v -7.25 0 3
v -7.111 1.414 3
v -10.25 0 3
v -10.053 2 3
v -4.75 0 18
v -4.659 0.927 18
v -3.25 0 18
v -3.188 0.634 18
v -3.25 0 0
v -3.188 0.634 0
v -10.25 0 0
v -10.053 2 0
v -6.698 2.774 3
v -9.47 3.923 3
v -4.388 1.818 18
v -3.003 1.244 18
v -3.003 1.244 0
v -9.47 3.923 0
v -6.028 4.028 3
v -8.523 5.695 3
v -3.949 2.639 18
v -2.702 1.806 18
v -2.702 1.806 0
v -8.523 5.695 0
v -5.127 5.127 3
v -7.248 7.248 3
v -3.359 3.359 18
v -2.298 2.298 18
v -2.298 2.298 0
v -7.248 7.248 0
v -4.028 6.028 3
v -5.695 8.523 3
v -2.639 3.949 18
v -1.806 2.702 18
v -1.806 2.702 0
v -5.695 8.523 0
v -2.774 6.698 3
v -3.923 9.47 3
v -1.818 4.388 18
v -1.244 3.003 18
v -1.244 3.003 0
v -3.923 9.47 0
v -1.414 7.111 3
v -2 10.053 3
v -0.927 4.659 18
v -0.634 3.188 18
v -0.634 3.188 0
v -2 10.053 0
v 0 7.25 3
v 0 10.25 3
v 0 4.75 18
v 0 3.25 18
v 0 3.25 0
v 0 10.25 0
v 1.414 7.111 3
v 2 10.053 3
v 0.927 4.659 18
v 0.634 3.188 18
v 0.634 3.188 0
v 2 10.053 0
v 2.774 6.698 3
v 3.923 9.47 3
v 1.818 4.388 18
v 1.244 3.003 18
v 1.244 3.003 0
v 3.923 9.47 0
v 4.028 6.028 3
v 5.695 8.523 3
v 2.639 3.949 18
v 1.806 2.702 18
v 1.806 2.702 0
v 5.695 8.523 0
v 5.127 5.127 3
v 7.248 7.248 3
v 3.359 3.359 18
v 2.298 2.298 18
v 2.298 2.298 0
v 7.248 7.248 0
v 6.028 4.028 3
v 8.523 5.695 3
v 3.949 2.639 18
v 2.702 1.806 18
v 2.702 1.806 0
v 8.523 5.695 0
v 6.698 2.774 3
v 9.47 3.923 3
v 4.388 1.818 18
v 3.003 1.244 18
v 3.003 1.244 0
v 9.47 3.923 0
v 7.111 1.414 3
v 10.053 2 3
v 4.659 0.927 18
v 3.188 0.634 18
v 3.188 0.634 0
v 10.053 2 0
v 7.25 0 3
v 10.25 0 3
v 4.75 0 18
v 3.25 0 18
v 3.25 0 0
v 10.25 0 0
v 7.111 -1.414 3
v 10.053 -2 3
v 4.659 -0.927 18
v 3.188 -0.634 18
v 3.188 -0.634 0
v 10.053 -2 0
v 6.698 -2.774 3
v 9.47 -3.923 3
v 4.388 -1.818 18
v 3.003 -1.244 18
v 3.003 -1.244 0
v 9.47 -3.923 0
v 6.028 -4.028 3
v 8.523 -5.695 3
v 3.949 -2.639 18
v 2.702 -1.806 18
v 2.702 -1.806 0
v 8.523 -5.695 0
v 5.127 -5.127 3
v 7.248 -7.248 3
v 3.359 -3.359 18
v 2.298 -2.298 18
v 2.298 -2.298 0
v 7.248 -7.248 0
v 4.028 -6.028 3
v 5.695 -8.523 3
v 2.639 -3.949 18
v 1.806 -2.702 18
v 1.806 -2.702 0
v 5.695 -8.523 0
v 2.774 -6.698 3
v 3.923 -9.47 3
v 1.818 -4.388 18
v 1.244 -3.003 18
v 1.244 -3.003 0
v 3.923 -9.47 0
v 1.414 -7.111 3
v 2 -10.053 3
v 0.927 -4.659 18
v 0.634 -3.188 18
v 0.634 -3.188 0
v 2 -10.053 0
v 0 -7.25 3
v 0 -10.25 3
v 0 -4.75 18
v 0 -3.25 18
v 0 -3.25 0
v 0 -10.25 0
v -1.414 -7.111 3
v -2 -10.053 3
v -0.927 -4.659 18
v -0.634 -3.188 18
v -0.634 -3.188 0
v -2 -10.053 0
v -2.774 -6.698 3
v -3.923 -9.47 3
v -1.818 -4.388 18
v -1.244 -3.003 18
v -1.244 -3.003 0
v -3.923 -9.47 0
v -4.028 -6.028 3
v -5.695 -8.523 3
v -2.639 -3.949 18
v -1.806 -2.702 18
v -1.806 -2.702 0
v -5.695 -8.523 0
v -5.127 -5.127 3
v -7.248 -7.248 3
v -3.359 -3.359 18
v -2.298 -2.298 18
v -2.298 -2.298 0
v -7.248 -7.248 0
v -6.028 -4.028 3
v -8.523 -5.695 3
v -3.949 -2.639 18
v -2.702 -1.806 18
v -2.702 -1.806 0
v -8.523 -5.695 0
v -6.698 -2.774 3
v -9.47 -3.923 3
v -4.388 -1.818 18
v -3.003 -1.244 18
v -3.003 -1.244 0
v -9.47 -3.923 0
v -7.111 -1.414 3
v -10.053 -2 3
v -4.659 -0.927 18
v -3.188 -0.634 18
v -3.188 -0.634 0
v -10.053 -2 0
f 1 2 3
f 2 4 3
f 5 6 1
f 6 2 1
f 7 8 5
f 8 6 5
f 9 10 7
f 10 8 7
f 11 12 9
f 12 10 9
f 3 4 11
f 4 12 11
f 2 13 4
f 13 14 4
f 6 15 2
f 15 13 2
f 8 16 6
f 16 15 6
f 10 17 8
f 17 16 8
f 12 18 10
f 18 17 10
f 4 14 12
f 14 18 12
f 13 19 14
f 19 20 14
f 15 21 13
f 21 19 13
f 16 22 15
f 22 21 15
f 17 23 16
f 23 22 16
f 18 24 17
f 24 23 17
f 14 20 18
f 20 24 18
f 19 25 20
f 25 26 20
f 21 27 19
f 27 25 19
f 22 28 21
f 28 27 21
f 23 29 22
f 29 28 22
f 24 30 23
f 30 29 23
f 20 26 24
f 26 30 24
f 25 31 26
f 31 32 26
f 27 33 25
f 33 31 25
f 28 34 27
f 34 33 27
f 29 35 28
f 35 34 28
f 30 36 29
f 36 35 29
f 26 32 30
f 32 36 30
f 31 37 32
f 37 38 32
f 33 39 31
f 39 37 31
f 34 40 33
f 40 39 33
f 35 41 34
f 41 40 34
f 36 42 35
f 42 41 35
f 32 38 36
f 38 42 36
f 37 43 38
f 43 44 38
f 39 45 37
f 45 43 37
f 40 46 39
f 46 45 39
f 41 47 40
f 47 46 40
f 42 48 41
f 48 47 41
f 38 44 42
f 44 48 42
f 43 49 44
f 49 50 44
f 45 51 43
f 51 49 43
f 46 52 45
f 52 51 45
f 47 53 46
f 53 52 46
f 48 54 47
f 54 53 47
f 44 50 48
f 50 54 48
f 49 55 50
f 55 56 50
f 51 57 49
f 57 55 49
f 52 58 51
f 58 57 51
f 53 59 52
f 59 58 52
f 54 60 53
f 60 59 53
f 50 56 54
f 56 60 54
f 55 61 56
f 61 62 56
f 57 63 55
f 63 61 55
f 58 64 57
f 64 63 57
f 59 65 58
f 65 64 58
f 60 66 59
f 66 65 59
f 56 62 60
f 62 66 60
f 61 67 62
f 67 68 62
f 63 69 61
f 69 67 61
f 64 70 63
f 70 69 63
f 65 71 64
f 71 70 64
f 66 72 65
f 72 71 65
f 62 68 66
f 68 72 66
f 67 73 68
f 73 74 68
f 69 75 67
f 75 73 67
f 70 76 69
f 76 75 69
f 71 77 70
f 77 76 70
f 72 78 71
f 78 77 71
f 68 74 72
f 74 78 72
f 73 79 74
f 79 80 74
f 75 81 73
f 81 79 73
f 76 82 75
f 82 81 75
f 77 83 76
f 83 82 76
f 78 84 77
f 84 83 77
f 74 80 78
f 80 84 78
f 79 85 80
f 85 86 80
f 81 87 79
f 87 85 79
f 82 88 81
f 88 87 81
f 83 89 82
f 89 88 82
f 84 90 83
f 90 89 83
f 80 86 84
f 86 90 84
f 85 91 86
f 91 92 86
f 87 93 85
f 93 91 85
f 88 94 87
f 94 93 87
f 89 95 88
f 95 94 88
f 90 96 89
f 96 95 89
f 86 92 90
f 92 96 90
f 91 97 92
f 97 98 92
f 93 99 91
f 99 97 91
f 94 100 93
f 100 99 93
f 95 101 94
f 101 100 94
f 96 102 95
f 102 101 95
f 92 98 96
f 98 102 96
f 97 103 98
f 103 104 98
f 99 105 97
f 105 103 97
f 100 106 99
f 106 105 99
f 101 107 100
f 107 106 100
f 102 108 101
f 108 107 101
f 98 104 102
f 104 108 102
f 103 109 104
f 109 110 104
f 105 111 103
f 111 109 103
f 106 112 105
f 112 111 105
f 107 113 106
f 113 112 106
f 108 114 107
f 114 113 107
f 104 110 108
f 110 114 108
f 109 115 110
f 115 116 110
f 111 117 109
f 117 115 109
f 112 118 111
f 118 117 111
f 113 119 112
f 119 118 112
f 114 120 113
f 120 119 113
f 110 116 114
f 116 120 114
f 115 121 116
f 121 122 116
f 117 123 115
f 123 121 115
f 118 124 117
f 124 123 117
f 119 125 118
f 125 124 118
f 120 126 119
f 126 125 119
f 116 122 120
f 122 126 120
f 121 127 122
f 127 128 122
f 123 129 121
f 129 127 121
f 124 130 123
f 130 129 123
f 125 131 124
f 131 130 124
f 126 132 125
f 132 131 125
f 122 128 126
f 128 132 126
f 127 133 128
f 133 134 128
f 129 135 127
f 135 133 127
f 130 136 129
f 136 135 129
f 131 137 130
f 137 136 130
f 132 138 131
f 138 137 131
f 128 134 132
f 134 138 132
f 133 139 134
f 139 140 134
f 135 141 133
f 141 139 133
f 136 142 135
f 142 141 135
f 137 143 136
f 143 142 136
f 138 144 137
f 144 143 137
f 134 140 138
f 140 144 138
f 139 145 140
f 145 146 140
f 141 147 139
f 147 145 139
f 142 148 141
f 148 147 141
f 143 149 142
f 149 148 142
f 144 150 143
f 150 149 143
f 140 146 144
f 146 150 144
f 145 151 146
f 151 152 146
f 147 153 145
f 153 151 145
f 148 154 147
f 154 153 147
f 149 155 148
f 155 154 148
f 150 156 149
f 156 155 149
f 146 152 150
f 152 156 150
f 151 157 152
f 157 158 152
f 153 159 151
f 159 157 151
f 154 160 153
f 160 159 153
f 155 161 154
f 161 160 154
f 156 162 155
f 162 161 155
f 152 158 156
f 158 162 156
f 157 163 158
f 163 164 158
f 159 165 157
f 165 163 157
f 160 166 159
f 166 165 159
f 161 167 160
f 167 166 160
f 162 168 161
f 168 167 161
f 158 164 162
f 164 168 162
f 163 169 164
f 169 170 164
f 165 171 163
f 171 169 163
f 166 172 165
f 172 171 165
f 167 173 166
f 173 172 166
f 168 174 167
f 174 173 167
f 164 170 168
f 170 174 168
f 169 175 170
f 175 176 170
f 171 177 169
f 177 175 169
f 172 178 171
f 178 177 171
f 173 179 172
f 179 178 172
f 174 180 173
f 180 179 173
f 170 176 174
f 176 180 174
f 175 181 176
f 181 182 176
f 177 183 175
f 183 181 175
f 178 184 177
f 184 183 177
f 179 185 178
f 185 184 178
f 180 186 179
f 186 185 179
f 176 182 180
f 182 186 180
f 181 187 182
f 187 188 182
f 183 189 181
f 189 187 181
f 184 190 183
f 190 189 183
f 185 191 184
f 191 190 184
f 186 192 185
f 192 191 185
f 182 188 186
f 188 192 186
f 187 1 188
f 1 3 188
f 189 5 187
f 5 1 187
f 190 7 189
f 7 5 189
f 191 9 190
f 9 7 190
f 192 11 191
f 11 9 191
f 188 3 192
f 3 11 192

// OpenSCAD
$fn = 32;

// ----------------------------------------------------------------------
// Profiled standoff: conical spacer, 18 mm long, bore 6.5 mm
// ----------------------------------------------------------------------

// --- parameters (mm) ---
revolve_angle = 360;      // full turn around the Z axis
profile_points = 6;       // points of the closed outline

profile = [[3.25, 0], [10.25, 0], [10.25, 3], [7.25, 3], [4.75, 18], [3.25, 18]];  // single closed polygon, 6 points, counter clockwise

// --- the one profile operation ---
rotate_extrude(angle = revolve_angle) polygon(points = profile);
